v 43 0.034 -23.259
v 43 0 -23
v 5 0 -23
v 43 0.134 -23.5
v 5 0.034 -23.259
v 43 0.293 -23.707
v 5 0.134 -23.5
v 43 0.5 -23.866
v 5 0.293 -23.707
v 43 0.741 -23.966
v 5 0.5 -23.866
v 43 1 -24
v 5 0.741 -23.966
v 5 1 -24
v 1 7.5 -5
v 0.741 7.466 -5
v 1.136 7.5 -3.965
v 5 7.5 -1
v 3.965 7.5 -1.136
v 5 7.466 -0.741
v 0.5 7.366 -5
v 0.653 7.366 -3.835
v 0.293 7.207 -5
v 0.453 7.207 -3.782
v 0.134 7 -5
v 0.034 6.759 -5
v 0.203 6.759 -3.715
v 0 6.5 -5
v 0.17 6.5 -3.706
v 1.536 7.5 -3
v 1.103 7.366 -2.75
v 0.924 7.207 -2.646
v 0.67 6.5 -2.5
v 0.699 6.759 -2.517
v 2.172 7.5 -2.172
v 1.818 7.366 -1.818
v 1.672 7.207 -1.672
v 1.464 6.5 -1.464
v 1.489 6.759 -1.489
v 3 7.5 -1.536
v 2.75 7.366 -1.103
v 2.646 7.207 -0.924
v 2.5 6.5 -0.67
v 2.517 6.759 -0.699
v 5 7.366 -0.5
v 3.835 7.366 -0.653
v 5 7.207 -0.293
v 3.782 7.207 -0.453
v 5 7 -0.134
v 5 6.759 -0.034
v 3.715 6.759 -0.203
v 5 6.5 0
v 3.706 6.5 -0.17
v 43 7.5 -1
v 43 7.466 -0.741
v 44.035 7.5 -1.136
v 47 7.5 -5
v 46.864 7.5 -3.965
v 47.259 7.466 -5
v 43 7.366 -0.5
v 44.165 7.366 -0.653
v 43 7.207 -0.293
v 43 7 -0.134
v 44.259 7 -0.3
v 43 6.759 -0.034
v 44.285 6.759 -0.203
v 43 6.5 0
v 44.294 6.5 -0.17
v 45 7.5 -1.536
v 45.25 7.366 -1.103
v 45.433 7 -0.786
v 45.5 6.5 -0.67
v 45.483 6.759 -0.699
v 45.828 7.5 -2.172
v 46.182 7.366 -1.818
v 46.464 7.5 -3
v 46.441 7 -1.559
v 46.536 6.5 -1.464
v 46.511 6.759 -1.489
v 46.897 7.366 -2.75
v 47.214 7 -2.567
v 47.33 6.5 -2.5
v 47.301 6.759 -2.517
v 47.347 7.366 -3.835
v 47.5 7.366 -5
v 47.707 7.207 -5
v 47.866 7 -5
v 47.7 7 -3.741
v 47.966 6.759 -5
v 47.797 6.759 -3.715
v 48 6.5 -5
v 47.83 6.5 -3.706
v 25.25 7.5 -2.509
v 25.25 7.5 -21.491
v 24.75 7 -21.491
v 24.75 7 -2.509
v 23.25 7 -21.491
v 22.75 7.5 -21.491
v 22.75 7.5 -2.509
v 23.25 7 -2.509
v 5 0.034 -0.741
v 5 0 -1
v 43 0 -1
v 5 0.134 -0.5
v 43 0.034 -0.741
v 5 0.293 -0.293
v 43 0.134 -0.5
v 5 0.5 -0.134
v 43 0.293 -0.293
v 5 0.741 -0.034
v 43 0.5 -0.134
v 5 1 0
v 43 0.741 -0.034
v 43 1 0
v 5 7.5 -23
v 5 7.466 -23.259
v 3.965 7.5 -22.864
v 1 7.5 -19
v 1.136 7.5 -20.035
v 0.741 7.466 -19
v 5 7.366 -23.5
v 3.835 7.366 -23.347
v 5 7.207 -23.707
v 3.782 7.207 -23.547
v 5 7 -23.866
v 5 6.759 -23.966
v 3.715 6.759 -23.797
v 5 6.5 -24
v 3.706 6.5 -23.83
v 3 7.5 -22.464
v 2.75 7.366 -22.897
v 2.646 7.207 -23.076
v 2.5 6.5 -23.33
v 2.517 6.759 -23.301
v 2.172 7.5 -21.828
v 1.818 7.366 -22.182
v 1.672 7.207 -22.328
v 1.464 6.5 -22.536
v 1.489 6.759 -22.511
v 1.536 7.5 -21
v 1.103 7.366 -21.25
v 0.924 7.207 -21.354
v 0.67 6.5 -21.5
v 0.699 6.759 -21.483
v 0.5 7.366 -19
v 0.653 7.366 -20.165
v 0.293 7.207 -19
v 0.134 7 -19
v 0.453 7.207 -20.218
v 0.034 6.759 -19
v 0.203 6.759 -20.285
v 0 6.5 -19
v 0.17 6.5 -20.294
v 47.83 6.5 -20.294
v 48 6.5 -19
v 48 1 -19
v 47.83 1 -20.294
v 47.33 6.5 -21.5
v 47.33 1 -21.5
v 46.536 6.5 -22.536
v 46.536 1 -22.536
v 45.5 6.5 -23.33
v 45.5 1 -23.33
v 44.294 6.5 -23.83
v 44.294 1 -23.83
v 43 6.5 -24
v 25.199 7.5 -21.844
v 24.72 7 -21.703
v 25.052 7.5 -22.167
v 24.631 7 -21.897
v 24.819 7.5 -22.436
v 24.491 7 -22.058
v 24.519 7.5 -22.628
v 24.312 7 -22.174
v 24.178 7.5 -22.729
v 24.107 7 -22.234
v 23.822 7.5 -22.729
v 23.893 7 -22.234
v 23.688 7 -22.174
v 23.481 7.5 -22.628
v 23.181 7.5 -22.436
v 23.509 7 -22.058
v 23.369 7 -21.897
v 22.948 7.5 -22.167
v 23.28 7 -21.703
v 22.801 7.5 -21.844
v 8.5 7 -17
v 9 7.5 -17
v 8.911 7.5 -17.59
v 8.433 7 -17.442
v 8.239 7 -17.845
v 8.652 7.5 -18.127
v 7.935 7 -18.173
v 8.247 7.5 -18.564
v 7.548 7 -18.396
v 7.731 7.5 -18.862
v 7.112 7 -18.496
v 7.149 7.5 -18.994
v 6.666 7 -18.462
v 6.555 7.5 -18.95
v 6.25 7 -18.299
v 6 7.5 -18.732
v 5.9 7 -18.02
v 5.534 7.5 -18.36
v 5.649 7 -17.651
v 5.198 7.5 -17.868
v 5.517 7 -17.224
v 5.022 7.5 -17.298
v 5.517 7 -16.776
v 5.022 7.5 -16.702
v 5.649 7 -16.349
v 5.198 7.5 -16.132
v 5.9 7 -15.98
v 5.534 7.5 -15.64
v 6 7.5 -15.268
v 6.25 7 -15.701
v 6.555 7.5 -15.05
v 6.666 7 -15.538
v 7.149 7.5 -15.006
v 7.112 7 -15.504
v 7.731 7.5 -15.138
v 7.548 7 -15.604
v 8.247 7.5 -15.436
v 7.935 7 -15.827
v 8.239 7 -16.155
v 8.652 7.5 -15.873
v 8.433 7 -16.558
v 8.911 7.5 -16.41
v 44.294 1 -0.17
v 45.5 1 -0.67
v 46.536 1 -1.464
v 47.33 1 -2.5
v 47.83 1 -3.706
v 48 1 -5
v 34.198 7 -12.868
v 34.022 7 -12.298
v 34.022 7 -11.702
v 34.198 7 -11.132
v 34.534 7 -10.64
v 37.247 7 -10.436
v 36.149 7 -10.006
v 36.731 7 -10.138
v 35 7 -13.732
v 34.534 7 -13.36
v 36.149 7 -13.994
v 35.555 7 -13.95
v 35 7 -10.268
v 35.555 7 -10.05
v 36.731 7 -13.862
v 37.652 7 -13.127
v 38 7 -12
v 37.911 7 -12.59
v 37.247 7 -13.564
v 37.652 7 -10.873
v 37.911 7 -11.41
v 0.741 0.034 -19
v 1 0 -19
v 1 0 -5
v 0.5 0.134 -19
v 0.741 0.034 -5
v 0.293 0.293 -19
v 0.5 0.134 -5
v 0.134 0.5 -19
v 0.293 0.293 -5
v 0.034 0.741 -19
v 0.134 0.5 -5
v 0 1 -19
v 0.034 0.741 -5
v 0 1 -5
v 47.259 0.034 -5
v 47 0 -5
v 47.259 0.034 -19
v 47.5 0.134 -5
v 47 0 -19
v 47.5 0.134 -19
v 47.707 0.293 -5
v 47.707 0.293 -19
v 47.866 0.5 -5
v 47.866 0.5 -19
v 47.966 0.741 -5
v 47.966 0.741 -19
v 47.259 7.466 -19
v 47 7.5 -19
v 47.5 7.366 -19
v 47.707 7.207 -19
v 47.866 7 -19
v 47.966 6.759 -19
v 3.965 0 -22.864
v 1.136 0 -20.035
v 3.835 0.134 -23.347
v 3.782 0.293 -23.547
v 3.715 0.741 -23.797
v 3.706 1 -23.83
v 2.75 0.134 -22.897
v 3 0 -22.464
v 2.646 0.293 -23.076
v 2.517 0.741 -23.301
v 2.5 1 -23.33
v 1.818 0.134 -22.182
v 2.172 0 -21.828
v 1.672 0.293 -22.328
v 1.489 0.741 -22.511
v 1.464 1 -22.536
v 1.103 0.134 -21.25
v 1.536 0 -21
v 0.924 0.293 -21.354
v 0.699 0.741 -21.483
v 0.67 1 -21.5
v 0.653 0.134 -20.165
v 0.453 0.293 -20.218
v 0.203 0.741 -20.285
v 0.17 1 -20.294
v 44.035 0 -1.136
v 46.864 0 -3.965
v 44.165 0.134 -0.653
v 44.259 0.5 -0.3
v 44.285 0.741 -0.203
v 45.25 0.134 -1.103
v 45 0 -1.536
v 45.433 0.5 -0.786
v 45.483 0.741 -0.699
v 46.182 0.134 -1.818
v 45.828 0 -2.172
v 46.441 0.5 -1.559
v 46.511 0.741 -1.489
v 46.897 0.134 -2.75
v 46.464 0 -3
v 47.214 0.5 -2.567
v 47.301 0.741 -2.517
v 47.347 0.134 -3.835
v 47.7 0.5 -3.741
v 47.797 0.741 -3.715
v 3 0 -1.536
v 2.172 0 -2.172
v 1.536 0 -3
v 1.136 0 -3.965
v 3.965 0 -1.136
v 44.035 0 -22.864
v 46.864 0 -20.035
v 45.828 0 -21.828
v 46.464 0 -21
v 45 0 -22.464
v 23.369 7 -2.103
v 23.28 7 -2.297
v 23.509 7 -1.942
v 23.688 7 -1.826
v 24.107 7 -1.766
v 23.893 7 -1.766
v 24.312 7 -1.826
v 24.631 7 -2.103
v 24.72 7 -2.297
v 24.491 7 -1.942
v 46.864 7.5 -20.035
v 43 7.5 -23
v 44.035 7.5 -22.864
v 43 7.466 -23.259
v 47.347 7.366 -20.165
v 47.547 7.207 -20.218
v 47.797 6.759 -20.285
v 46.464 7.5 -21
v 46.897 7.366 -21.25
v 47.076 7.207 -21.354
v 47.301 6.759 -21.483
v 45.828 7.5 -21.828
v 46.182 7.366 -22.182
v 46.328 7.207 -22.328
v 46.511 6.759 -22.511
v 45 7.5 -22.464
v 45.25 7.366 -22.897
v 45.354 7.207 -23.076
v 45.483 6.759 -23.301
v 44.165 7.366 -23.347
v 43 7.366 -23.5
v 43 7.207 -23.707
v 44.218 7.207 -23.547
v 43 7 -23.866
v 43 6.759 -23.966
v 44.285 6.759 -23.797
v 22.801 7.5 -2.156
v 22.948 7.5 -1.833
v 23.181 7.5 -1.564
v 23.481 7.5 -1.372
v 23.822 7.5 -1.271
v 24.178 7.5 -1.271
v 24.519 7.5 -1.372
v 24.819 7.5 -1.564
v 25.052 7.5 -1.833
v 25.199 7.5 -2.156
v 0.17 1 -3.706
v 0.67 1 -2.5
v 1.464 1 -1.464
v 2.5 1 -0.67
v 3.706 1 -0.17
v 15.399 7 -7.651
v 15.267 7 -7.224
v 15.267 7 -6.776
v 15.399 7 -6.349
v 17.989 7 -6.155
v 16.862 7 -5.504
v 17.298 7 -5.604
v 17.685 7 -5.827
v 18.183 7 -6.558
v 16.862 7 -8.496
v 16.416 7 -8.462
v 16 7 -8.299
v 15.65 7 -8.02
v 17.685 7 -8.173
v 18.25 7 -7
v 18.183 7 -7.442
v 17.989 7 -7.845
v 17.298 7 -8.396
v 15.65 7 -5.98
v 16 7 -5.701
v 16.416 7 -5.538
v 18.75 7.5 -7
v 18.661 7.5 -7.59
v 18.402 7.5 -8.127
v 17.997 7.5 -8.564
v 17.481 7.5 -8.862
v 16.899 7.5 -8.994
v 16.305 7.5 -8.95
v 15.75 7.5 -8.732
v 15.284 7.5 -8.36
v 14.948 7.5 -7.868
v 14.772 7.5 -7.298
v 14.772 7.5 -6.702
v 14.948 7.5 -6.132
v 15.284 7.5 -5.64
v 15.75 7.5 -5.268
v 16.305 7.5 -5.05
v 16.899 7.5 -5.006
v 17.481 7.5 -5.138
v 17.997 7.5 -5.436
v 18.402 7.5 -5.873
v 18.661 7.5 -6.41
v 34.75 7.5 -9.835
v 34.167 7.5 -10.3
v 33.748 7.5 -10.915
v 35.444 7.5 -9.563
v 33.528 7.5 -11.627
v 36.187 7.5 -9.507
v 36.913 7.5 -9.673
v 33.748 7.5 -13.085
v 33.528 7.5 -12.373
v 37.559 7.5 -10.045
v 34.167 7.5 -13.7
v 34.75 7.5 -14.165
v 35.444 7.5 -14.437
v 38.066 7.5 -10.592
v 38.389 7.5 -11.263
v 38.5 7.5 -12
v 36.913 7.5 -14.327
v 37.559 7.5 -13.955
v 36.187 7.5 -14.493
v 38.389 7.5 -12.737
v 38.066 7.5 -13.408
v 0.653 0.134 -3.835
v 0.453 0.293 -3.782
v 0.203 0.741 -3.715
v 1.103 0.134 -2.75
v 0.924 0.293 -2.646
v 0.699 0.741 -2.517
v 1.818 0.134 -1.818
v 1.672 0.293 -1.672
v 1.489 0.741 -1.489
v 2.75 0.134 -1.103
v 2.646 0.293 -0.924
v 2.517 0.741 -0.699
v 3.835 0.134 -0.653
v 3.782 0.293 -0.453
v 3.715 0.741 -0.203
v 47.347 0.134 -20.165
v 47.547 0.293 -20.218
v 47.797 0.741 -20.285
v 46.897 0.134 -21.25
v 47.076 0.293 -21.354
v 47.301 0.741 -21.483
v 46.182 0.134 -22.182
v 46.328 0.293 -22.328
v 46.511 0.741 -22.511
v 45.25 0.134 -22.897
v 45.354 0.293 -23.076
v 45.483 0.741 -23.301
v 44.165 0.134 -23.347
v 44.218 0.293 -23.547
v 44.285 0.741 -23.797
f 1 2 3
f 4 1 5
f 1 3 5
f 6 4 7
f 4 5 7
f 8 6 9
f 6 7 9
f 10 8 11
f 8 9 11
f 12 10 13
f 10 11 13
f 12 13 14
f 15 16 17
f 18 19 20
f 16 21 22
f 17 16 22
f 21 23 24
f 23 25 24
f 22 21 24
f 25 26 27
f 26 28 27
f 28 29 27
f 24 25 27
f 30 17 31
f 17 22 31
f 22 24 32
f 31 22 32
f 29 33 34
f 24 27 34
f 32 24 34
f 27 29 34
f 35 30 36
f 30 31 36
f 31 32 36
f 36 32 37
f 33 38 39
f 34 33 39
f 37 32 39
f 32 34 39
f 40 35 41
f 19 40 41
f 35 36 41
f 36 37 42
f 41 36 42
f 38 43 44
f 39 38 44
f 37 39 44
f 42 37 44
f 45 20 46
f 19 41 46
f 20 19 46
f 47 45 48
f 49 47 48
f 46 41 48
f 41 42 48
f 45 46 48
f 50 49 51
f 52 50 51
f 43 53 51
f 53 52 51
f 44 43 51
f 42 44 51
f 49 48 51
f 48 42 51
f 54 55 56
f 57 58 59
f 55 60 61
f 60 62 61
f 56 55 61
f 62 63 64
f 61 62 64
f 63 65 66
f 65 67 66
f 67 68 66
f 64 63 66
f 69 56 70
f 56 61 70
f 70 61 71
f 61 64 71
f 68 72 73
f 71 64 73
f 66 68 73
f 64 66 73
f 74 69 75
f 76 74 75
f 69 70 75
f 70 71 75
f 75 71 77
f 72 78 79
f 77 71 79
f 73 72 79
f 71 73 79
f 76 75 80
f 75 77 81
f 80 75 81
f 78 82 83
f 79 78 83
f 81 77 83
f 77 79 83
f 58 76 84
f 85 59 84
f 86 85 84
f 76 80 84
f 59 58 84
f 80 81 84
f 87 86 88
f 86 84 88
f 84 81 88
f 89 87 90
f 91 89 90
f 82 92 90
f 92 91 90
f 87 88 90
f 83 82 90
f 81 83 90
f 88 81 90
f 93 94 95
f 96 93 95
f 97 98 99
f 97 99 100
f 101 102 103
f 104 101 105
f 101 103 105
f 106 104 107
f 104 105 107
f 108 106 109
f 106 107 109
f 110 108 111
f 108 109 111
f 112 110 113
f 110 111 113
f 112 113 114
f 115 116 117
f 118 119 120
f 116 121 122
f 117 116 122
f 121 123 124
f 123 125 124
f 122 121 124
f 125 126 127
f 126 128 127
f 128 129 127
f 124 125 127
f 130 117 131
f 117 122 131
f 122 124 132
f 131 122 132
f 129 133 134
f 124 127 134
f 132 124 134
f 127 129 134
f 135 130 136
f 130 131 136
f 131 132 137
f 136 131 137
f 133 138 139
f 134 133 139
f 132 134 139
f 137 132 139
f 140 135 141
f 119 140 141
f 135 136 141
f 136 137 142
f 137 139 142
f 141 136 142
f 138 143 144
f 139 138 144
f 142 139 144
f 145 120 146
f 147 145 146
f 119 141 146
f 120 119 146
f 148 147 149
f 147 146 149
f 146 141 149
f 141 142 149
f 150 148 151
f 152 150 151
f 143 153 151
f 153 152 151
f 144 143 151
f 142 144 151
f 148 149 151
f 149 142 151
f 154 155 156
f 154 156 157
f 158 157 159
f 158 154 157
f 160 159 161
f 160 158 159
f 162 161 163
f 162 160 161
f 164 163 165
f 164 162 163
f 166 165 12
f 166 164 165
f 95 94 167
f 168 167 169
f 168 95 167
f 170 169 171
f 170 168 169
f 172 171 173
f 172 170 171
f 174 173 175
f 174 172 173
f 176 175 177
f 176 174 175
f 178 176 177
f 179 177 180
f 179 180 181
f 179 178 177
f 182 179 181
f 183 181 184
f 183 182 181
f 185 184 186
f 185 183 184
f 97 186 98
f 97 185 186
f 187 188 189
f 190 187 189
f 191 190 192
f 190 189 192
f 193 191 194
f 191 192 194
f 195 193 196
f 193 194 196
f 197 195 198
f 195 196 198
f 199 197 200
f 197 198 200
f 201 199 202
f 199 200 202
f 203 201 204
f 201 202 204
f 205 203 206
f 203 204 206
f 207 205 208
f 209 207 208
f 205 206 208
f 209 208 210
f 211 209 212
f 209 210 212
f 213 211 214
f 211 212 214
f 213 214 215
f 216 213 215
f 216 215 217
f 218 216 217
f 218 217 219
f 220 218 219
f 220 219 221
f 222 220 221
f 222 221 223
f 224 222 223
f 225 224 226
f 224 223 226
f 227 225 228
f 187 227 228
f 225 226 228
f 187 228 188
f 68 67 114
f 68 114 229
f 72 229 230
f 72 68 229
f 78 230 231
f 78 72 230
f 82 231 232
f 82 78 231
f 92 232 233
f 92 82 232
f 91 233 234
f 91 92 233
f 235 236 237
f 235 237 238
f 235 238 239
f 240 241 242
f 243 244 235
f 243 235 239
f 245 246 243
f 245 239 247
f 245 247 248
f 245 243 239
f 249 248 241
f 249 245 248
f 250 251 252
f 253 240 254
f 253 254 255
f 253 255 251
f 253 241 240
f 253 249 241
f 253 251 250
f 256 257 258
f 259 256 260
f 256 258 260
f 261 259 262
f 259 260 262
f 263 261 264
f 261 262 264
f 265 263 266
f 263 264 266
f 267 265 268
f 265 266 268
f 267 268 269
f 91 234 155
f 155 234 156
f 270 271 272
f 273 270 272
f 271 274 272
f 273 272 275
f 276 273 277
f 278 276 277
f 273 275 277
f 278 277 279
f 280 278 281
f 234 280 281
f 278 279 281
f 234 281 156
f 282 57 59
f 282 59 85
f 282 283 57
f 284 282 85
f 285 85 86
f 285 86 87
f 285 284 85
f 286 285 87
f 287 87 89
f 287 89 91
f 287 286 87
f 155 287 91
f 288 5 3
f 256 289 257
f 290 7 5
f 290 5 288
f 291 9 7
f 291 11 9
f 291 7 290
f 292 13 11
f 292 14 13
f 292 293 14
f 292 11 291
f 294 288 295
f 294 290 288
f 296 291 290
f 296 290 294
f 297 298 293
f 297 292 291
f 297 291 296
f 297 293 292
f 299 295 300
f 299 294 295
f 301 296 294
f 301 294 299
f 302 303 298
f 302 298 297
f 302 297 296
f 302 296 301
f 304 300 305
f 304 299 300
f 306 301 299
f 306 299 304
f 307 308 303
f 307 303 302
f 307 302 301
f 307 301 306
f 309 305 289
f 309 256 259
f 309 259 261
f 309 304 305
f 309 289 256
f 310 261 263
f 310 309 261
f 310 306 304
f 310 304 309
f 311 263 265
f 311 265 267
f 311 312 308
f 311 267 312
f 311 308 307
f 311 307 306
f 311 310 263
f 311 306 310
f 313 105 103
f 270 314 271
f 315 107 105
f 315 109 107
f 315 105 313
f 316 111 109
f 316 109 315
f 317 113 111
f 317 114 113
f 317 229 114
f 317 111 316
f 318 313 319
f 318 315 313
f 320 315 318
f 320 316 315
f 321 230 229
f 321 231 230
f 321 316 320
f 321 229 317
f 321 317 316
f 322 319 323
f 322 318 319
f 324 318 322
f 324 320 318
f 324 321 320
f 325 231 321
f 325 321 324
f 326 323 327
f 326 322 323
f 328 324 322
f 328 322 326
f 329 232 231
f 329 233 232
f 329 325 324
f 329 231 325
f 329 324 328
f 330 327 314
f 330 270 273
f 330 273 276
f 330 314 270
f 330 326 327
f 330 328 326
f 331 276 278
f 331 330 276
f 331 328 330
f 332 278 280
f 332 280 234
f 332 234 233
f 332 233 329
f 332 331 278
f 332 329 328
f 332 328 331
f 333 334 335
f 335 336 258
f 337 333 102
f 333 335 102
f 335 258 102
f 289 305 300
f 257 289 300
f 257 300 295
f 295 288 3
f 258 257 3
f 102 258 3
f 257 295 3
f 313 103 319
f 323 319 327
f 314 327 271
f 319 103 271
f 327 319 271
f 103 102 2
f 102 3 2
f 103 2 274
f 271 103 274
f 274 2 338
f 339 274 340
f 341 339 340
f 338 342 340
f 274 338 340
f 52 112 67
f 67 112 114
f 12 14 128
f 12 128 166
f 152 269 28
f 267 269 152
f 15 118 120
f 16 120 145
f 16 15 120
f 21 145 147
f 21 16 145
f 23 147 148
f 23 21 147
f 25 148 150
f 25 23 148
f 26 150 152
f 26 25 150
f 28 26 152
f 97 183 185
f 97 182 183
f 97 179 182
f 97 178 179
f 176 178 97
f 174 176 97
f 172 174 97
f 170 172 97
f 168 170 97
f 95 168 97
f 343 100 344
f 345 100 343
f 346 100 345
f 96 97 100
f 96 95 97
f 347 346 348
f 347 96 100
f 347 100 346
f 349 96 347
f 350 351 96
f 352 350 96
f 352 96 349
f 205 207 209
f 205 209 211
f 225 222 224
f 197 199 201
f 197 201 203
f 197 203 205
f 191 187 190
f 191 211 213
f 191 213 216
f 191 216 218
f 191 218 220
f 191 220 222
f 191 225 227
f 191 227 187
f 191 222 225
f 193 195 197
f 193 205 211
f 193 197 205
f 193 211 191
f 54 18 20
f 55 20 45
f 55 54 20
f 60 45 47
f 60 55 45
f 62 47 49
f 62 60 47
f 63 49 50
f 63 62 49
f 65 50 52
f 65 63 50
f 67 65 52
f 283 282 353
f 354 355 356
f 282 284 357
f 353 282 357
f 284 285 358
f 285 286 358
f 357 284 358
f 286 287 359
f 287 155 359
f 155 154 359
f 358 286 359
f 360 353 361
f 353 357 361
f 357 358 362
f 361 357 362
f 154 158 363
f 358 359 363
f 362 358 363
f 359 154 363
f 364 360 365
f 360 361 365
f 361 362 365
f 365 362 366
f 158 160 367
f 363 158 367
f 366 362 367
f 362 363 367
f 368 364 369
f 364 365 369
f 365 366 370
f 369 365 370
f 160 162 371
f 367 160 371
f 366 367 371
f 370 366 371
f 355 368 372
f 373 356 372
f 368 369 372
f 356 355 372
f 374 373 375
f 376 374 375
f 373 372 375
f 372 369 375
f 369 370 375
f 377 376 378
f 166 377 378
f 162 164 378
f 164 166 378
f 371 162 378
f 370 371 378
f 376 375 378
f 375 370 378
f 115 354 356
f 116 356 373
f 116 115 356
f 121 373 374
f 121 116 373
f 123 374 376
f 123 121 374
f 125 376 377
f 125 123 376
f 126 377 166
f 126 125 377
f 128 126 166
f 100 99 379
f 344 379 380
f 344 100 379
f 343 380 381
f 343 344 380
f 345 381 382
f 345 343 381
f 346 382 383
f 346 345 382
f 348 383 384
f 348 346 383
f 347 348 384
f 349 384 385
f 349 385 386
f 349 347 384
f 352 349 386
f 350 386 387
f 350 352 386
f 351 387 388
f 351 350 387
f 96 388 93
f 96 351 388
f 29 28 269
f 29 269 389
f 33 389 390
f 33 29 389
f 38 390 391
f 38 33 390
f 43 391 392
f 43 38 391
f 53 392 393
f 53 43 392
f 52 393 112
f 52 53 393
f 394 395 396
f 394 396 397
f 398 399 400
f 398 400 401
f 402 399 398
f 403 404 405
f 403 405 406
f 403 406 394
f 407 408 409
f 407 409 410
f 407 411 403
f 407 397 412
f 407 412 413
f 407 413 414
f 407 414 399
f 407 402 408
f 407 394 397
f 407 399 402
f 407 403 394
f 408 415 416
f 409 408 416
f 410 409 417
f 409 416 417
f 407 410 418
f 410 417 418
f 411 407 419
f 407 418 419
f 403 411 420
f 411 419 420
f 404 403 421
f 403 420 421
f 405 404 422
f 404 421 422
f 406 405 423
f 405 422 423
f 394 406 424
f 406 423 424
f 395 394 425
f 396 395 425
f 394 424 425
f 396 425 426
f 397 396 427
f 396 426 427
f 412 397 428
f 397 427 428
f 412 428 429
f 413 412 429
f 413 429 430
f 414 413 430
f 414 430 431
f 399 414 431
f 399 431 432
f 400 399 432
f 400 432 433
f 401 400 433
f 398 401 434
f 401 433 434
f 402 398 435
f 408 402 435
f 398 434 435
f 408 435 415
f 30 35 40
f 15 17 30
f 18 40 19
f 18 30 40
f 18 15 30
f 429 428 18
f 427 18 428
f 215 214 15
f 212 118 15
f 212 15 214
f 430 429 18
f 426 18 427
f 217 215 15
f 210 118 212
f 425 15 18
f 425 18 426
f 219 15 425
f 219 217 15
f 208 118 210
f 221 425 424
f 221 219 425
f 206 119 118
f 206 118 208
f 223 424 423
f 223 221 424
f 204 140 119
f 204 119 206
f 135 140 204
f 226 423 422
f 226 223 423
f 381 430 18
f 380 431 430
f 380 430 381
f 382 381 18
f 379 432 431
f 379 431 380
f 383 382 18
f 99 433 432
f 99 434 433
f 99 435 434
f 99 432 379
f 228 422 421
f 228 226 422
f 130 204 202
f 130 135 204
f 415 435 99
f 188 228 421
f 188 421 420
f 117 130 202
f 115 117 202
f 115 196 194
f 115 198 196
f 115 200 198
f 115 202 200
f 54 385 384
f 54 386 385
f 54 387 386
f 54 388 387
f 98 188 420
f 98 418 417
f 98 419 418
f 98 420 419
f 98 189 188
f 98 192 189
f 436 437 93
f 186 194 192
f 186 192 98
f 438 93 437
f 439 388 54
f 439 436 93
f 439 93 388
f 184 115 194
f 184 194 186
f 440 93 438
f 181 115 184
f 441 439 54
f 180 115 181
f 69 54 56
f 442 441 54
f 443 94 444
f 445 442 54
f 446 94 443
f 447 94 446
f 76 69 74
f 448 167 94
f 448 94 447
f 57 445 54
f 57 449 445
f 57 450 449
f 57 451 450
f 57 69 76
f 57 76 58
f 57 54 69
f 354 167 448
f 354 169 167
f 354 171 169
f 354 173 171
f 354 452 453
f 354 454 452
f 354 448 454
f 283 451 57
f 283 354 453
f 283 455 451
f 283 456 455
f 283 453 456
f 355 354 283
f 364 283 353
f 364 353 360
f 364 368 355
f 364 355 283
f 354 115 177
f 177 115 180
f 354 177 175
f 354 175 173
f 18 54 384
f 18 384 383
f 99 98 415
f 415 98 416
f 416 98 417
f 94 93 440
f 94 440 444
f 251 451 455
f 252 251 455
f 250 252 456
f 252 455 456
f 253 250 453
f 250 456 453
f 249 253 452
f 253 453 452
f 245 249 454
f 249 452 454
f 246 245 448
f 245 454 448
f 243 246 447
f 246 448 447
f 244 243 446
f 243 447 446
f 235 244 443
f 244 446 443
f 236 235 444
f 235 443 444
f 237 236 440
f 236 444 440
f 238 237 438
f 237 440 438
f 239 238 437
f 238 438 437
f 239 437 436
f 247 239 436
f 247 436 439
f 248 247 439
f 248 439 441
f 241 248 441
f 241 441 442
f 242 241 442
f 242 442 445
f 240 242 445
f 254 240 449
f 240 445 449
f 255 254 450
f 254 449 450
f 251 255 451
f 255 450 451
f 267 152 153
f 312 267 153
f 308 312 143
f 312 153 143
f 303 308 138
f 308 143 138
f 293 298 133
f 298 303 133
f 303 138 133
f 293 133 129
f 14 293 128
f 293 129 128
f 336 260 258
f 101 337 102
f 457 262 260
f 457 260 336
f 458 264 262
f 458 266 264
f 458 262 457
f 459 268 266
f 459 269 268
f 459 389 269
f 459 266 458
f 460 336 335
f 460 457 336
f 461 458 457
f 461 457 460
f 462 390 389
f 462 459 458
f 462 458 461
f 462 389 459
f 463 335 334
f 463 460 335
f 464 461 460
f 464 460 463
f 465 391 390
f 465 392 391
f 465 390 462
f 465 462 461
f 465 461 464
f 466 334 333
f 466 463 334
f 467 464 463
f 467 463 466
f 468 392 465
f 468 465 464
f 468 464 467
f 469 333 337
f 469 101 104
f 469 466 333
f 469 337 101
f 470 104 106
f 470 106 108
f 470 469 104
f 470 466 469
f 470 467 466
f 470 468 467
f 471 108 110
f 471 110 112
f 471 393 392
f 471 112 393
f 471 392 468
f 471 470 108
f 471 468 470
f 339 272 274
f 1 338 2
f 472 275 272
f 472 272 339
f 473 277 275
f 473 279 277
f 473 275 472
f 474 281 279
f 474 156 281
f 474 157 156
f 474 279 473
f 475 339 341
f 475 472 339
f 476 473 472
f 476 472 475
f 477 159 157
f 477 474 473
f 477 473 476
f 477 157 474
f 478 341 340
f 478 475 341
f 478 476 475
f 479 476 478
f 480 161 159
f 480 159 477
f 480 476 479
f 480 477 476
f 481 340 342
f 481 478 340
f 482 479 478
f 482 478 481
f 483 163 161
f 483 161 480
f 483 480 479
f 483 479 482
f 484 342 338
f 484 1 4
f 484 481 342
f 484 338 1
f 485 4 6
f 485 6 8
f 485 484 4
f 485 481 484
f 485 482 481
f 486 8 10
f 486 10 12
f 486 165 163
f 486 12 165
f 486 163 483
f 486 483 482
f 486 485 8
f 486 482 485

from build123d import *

# Parameters (mm, degrees)
ESQUISSE1_W                = 48
ESQUISSE1_H                = 24
EXTRUSION1_DEPTH           = 7.5
CONG_2_R                   = 5
CONG_5_R                   = 1
CONG_6_R                   = 1
ESQUISSE4_W                = 0.5
ESQUISSE4_H                = 18.982849842
EXTRUSION2_DEPTH           = 0.5
ESQUISSE5_R                = 0.25
EXTRUSION3_DEPTH           = 0.5
CHANFREIN1_SIZE            = 1
ESQUISSE10_R               = 2
EXTRUSION7_DEPTH           = 0.5
EXTRUSION7_DRAFT           = -45
EXTRUSION7_PROFILE_2_DEPTH = 0.5
EXTRUSION7_PROFILE_2_DRAFT = -45
ESQUISSE11_R               = 2.5
EXTRUSION8_DEPTH           = 0.5
EXTRUSION8_DRAFT           = -45


with BuildPart() as part:
    # Esquisse1 → Extrusion1 (new body)
    with BuildSketch(Plane(origin=(0, 0, 0), x_dir=(1, 0, 0), z_dir=(0, 1, 0))):
        with Locations((24, 12)):
            Rectangle(ESQUISSE1_W, ESQUISSE1_H)
    extrude(amount=EXTRUSION1_DEPTH)

    # Congé2
    cong_2_edges = [part.edges().sort_by_distance(p)[0] for p in [
        (0, 3.75, -24),
        (48, 3.75, -24),
        (48, 3.75, 0),
        (0, 3.75, 0),
    ]]
    fillet(cong_2_edges, radius=CONG_2_R)

    # Congé5
    cong_5_edges = [part.edges().sort_by_distance(p)[0] for p in [
        (48, 7.5, -12),
        (24, 7.5, 0),
        (0, 7.5, -12),
        (24, 7.5, -24),
        (1.464466094, 7.5, -22.535533906),
        (1.464466094, 7.5, -1.464466094),
        (46.535533906, 7.5, -22.535533906),
        (46.535533906, 7.5, -1.464466094),
    ]]
    fillet(cong_5_edges, radius=CONG_5_R)

    # Congé6
    cong_6_edges = [part.edges().sort_by_distance(p)[0] for p in [
        (48, 0, -12),
        (0, 0, -12),
        (24, 0, -24),
        (24, 0, 0),
        (1.464466094, 0, -22.535533906),
        (1.464466094, 0, -1.464466094),
        (46.535533906, 0, -22.535533906),
        (46.535533906, 0, -1.464466094),
    ]]
    fillet(cong_6_edges, radius=CONG_6_R)

    # Esquisse4 → Extrusion2 (cut)
    with BuildSketch(Plane(origin=(0, 7.5, 0), x_dir=(1, 0, 0), z_dir=(0, 1, 0))):
        with Locations((24, 12)):
            Rectangle(ESQUISSE4_W, ESQUISSE4_H)
    extrude(amount=-EXTRUSION2_DEPTH, mode=Mode.SUBTRACT)

    # Esquisse5 → Extrusion3 (cut)
    with BuildSketch(Plane(origin=(0, 7.5, 0), x_dir=(1, 0, 0), z_dir=(0, 1, 0))):
        with Locations((24, 21.491424921)):
            Circle(ESQUISSE5_R)
        with Locations((24, 2.508575079)):
            Circle(ESQUISSE5_R)
    extrude(amount=-EXTRUSION3_DEPTH, mode=Mode.SUBTRACT)

    # Chanfrein1
    # the kernel refuses this chamfer: 1 mm, written as the material it takes off along each edge
    with BuildSketch(Plane(origin=(24, 7.5, -21.491424921), x_dir=(1, 0, 0), z_dir=(0, 0, 1))) as chanfrein1_piece_1_section:
        Polygon((0.25 + CHANFREIN1_SIZE, 0), (0.25, -CHANFREIN1_SIZE), (0.25, 0), align=None)
    chanfrein1_piece_1 = revolve(axis=Axis((24, 7.5, -21.491424921), (0, 1, 0)), revolution_arc=180, mode=Mode.PRIVATE)
    chanfrein1_piece_1 = split(chanfrein1_piece_1, bisect_by=Plane(origin=(24, 7, -21.964580549), z_dir=(0, 1, 0)), keep=Keep.TOP, mode=Mode.PRIVATE)
    add(chanfrein1_piece_1, mode=Mode.SUBTRACT)
    with BuildSketch(Plane(origin=(24.25, 7.5, -21.491424921), x_dir=(0.9996219169112968, 0.02749587661058651, 0), z_dir=(0, 0, 1))) as chanfrein1_piece_2_section:
        Polygon((CHANFREIN1_SIZE * 0.999621916911, -CHANFREIN1_SIZE * 0.0274958766106), (-CHANFREIN1_SIZE * 0.0274958766106, -CHANFREIN1_SIZE * 0.999621916911), (0, 0), align=None)
    chanfrein1_piece_2 = extrude(amount=18.982849842, mode=Mode.PRIVATE)
    chanfrein1_piece_2 = split(chanfrein1_piece_2, bisect_by=Plane(origin=(24.643401084, 7, -12), z_dir=(0, 1, 0)), keep=Keep.TOP, mode=Mode.PRIVATE)
    add(chanfrein1_piece_2, mode=Mode.SUBTRACT)
    with BuildSketch(Plane(origin=(24, 7.5, -2.508575079), x_dir=(-1, 0, 0), z_dir=(0, 0, -1))) as chanfrein1_piece_3_section:
        Polygon((0.25 + CHANFREIN1_SIZE, 0), (0.25, -CHANFREIN1_SIZE), (0.25, 0), align=None)
    chanfrein1_piece_3 = revolve(axis=Axis((24, 7.5, -2.508575079), (0, 1, 0)), revolution_arc=180, mode=Mode.PRIVATE)
    chanfrein1_piece_3 = split(chanfrein1_piece_3, bisect_by=Plane(origin=(24, 7, -2.035419451), z_dir=(0, 1, 0)), keep=Keep.TOP, mode=Mode.PRIVATE)
    add(chanfrein1_piece_3, mode=Mode.SUBTRACT)
    with BuildSketch(Plane(origin=(23.75, 7.5, -2.508575079), x_dir=(-0.9996219169112968, 0.02749587661058651, 0), z_dir=(0, 0, -1))) as chanfrein1_piece_4_section:
        Polygon((CHANFREIN1_SIZE * 0.999621916911, -CHANFREIN1_SIZE * 0.0274958766106), (-CHANFREIN1_SIZE * 0.0274958766106, -CHANFREIN1_SIZE * 0.999621916911), (0, 0), align=None)
    chanfrein1_piece_4 = extrude(amount=18.982849842, mode=Mode.PRIVATE)
    chanfrein1_piece_4 = split(chanfrein1_piece_4, bisect_by=Plane(origin=(23.356598916, 7, -12), z_dir=(0, 1, 0)), keep=Keep.TOP, mode=Mode.PRIVATE)
    add(chanfrein1_piece_4, mode=Mode.SUBTRACT)


with BuildPart() as extrusion7_tool:
    # Esquisse10 → Extrusion7 (with draft: the straight prism first)
    with BuildSketch(Plane(origin=(0, 7.5, 0), x_dir=(1, 0, 0), z_dir=(0, 1, 0))):
        with Locations((7, 17)):
            Circle(ESQUISSE10_R)
    extrude(amount=-EXTRUSION7_DEPTH)
    # Extrusion7: the draft: its side faces are tilted about the plane it starts from
    extrusion7_sides = [extrusion7_tool.faces().sort_by_distance(p)[0] for p in [
        (5, 7.25, -17),
    ]]
    draft(extrusion7_sides, Plane(origin=(0, 7.5, 0), x_dir=(1, 0, 0), z_dir=(0, 1, 0)), EXTRUSION7_DRAFT)


with BuildPart() as part_1:
    add(part.part)

    # Extrusion7: cut by extrusion7_tool
    add(extrusion7_tool.part, mode=Mode.SUBTRACT)


with BuildPart() as extrusion7_profile_2_tool:
    # Esquisse10 → Extrusion7 profile 2 (with draft: the straight prism first)
    with BuildSketch(Plane(origin=(0, 7.5, 0), x_dir=(1, 0, 0), z_dir=(0, 1, 0))):
        with Locations((16.75, 7)):
            Circle(ESQUISSE10_R)
    extrude(amount=-EXTRUSION7_PROFILE_2_DEPTH)
    # Extrusion7 profile 2: the draft: its side faces are tilted about the plane it starts from
    extrusion7_profile_2_sides = [extrusion7_profile_2_tool.faces().sort_by_distance(p)[0] for p in [
        (14.75, 7.25, -7),
    ]]
    draft(extrusion7_profile_2_sides, Plane(origin=(0, 7.5, 0), x_dir=(1, 0, 0), z_dir=(0, 1, 0)), EXTRUSION7_PROFILE_2_DRAFT)


with BuildPart() as part_2:
    add(part_1.part)

    # Extrusion7 profile 2: cut by extrusion7_profile_2_tool
    add(extrusion7_profile_2_tool.part, mode=Mode.SUBTRACT)


with BuildPart() as extrusion8_tool:
    # Esquisse11 → Extrusion8 (with draft: the straight prism first)
    with BuildSketch(Plane(origin=(0, 7.5, 0), x_dir=(1, 0, 0), z_dir=(0, 1, 0))):
        with Locations((36, 12)):
            Circle(ESQUISSE11_R)
    extrude(amount=-EXTRUSION8_DEPTH)
    # Extrusion8: the draft: its side faces are tilted about the plane it starts from
    extrusion8_sides = [extrusion8_tool.faces().sort_by_distance(p)[0] for p in [
        (33.5, 7.25, -12),
    ]]
    draft(extrusion8_sides, Plane(origin=(0, 7.5, 0), x_dir=(1, 0, 0), z_dir=(0, 1, 0)), EXTRUSION8_DRAFT)


with BuildPart() as part_3:
    add(part_2.part)

    # Extrusion8: cut by extrusion8_tool
    add(extrusion8_tool.part, mode=Mode.SUBTRACT)


solid = part_3.part
